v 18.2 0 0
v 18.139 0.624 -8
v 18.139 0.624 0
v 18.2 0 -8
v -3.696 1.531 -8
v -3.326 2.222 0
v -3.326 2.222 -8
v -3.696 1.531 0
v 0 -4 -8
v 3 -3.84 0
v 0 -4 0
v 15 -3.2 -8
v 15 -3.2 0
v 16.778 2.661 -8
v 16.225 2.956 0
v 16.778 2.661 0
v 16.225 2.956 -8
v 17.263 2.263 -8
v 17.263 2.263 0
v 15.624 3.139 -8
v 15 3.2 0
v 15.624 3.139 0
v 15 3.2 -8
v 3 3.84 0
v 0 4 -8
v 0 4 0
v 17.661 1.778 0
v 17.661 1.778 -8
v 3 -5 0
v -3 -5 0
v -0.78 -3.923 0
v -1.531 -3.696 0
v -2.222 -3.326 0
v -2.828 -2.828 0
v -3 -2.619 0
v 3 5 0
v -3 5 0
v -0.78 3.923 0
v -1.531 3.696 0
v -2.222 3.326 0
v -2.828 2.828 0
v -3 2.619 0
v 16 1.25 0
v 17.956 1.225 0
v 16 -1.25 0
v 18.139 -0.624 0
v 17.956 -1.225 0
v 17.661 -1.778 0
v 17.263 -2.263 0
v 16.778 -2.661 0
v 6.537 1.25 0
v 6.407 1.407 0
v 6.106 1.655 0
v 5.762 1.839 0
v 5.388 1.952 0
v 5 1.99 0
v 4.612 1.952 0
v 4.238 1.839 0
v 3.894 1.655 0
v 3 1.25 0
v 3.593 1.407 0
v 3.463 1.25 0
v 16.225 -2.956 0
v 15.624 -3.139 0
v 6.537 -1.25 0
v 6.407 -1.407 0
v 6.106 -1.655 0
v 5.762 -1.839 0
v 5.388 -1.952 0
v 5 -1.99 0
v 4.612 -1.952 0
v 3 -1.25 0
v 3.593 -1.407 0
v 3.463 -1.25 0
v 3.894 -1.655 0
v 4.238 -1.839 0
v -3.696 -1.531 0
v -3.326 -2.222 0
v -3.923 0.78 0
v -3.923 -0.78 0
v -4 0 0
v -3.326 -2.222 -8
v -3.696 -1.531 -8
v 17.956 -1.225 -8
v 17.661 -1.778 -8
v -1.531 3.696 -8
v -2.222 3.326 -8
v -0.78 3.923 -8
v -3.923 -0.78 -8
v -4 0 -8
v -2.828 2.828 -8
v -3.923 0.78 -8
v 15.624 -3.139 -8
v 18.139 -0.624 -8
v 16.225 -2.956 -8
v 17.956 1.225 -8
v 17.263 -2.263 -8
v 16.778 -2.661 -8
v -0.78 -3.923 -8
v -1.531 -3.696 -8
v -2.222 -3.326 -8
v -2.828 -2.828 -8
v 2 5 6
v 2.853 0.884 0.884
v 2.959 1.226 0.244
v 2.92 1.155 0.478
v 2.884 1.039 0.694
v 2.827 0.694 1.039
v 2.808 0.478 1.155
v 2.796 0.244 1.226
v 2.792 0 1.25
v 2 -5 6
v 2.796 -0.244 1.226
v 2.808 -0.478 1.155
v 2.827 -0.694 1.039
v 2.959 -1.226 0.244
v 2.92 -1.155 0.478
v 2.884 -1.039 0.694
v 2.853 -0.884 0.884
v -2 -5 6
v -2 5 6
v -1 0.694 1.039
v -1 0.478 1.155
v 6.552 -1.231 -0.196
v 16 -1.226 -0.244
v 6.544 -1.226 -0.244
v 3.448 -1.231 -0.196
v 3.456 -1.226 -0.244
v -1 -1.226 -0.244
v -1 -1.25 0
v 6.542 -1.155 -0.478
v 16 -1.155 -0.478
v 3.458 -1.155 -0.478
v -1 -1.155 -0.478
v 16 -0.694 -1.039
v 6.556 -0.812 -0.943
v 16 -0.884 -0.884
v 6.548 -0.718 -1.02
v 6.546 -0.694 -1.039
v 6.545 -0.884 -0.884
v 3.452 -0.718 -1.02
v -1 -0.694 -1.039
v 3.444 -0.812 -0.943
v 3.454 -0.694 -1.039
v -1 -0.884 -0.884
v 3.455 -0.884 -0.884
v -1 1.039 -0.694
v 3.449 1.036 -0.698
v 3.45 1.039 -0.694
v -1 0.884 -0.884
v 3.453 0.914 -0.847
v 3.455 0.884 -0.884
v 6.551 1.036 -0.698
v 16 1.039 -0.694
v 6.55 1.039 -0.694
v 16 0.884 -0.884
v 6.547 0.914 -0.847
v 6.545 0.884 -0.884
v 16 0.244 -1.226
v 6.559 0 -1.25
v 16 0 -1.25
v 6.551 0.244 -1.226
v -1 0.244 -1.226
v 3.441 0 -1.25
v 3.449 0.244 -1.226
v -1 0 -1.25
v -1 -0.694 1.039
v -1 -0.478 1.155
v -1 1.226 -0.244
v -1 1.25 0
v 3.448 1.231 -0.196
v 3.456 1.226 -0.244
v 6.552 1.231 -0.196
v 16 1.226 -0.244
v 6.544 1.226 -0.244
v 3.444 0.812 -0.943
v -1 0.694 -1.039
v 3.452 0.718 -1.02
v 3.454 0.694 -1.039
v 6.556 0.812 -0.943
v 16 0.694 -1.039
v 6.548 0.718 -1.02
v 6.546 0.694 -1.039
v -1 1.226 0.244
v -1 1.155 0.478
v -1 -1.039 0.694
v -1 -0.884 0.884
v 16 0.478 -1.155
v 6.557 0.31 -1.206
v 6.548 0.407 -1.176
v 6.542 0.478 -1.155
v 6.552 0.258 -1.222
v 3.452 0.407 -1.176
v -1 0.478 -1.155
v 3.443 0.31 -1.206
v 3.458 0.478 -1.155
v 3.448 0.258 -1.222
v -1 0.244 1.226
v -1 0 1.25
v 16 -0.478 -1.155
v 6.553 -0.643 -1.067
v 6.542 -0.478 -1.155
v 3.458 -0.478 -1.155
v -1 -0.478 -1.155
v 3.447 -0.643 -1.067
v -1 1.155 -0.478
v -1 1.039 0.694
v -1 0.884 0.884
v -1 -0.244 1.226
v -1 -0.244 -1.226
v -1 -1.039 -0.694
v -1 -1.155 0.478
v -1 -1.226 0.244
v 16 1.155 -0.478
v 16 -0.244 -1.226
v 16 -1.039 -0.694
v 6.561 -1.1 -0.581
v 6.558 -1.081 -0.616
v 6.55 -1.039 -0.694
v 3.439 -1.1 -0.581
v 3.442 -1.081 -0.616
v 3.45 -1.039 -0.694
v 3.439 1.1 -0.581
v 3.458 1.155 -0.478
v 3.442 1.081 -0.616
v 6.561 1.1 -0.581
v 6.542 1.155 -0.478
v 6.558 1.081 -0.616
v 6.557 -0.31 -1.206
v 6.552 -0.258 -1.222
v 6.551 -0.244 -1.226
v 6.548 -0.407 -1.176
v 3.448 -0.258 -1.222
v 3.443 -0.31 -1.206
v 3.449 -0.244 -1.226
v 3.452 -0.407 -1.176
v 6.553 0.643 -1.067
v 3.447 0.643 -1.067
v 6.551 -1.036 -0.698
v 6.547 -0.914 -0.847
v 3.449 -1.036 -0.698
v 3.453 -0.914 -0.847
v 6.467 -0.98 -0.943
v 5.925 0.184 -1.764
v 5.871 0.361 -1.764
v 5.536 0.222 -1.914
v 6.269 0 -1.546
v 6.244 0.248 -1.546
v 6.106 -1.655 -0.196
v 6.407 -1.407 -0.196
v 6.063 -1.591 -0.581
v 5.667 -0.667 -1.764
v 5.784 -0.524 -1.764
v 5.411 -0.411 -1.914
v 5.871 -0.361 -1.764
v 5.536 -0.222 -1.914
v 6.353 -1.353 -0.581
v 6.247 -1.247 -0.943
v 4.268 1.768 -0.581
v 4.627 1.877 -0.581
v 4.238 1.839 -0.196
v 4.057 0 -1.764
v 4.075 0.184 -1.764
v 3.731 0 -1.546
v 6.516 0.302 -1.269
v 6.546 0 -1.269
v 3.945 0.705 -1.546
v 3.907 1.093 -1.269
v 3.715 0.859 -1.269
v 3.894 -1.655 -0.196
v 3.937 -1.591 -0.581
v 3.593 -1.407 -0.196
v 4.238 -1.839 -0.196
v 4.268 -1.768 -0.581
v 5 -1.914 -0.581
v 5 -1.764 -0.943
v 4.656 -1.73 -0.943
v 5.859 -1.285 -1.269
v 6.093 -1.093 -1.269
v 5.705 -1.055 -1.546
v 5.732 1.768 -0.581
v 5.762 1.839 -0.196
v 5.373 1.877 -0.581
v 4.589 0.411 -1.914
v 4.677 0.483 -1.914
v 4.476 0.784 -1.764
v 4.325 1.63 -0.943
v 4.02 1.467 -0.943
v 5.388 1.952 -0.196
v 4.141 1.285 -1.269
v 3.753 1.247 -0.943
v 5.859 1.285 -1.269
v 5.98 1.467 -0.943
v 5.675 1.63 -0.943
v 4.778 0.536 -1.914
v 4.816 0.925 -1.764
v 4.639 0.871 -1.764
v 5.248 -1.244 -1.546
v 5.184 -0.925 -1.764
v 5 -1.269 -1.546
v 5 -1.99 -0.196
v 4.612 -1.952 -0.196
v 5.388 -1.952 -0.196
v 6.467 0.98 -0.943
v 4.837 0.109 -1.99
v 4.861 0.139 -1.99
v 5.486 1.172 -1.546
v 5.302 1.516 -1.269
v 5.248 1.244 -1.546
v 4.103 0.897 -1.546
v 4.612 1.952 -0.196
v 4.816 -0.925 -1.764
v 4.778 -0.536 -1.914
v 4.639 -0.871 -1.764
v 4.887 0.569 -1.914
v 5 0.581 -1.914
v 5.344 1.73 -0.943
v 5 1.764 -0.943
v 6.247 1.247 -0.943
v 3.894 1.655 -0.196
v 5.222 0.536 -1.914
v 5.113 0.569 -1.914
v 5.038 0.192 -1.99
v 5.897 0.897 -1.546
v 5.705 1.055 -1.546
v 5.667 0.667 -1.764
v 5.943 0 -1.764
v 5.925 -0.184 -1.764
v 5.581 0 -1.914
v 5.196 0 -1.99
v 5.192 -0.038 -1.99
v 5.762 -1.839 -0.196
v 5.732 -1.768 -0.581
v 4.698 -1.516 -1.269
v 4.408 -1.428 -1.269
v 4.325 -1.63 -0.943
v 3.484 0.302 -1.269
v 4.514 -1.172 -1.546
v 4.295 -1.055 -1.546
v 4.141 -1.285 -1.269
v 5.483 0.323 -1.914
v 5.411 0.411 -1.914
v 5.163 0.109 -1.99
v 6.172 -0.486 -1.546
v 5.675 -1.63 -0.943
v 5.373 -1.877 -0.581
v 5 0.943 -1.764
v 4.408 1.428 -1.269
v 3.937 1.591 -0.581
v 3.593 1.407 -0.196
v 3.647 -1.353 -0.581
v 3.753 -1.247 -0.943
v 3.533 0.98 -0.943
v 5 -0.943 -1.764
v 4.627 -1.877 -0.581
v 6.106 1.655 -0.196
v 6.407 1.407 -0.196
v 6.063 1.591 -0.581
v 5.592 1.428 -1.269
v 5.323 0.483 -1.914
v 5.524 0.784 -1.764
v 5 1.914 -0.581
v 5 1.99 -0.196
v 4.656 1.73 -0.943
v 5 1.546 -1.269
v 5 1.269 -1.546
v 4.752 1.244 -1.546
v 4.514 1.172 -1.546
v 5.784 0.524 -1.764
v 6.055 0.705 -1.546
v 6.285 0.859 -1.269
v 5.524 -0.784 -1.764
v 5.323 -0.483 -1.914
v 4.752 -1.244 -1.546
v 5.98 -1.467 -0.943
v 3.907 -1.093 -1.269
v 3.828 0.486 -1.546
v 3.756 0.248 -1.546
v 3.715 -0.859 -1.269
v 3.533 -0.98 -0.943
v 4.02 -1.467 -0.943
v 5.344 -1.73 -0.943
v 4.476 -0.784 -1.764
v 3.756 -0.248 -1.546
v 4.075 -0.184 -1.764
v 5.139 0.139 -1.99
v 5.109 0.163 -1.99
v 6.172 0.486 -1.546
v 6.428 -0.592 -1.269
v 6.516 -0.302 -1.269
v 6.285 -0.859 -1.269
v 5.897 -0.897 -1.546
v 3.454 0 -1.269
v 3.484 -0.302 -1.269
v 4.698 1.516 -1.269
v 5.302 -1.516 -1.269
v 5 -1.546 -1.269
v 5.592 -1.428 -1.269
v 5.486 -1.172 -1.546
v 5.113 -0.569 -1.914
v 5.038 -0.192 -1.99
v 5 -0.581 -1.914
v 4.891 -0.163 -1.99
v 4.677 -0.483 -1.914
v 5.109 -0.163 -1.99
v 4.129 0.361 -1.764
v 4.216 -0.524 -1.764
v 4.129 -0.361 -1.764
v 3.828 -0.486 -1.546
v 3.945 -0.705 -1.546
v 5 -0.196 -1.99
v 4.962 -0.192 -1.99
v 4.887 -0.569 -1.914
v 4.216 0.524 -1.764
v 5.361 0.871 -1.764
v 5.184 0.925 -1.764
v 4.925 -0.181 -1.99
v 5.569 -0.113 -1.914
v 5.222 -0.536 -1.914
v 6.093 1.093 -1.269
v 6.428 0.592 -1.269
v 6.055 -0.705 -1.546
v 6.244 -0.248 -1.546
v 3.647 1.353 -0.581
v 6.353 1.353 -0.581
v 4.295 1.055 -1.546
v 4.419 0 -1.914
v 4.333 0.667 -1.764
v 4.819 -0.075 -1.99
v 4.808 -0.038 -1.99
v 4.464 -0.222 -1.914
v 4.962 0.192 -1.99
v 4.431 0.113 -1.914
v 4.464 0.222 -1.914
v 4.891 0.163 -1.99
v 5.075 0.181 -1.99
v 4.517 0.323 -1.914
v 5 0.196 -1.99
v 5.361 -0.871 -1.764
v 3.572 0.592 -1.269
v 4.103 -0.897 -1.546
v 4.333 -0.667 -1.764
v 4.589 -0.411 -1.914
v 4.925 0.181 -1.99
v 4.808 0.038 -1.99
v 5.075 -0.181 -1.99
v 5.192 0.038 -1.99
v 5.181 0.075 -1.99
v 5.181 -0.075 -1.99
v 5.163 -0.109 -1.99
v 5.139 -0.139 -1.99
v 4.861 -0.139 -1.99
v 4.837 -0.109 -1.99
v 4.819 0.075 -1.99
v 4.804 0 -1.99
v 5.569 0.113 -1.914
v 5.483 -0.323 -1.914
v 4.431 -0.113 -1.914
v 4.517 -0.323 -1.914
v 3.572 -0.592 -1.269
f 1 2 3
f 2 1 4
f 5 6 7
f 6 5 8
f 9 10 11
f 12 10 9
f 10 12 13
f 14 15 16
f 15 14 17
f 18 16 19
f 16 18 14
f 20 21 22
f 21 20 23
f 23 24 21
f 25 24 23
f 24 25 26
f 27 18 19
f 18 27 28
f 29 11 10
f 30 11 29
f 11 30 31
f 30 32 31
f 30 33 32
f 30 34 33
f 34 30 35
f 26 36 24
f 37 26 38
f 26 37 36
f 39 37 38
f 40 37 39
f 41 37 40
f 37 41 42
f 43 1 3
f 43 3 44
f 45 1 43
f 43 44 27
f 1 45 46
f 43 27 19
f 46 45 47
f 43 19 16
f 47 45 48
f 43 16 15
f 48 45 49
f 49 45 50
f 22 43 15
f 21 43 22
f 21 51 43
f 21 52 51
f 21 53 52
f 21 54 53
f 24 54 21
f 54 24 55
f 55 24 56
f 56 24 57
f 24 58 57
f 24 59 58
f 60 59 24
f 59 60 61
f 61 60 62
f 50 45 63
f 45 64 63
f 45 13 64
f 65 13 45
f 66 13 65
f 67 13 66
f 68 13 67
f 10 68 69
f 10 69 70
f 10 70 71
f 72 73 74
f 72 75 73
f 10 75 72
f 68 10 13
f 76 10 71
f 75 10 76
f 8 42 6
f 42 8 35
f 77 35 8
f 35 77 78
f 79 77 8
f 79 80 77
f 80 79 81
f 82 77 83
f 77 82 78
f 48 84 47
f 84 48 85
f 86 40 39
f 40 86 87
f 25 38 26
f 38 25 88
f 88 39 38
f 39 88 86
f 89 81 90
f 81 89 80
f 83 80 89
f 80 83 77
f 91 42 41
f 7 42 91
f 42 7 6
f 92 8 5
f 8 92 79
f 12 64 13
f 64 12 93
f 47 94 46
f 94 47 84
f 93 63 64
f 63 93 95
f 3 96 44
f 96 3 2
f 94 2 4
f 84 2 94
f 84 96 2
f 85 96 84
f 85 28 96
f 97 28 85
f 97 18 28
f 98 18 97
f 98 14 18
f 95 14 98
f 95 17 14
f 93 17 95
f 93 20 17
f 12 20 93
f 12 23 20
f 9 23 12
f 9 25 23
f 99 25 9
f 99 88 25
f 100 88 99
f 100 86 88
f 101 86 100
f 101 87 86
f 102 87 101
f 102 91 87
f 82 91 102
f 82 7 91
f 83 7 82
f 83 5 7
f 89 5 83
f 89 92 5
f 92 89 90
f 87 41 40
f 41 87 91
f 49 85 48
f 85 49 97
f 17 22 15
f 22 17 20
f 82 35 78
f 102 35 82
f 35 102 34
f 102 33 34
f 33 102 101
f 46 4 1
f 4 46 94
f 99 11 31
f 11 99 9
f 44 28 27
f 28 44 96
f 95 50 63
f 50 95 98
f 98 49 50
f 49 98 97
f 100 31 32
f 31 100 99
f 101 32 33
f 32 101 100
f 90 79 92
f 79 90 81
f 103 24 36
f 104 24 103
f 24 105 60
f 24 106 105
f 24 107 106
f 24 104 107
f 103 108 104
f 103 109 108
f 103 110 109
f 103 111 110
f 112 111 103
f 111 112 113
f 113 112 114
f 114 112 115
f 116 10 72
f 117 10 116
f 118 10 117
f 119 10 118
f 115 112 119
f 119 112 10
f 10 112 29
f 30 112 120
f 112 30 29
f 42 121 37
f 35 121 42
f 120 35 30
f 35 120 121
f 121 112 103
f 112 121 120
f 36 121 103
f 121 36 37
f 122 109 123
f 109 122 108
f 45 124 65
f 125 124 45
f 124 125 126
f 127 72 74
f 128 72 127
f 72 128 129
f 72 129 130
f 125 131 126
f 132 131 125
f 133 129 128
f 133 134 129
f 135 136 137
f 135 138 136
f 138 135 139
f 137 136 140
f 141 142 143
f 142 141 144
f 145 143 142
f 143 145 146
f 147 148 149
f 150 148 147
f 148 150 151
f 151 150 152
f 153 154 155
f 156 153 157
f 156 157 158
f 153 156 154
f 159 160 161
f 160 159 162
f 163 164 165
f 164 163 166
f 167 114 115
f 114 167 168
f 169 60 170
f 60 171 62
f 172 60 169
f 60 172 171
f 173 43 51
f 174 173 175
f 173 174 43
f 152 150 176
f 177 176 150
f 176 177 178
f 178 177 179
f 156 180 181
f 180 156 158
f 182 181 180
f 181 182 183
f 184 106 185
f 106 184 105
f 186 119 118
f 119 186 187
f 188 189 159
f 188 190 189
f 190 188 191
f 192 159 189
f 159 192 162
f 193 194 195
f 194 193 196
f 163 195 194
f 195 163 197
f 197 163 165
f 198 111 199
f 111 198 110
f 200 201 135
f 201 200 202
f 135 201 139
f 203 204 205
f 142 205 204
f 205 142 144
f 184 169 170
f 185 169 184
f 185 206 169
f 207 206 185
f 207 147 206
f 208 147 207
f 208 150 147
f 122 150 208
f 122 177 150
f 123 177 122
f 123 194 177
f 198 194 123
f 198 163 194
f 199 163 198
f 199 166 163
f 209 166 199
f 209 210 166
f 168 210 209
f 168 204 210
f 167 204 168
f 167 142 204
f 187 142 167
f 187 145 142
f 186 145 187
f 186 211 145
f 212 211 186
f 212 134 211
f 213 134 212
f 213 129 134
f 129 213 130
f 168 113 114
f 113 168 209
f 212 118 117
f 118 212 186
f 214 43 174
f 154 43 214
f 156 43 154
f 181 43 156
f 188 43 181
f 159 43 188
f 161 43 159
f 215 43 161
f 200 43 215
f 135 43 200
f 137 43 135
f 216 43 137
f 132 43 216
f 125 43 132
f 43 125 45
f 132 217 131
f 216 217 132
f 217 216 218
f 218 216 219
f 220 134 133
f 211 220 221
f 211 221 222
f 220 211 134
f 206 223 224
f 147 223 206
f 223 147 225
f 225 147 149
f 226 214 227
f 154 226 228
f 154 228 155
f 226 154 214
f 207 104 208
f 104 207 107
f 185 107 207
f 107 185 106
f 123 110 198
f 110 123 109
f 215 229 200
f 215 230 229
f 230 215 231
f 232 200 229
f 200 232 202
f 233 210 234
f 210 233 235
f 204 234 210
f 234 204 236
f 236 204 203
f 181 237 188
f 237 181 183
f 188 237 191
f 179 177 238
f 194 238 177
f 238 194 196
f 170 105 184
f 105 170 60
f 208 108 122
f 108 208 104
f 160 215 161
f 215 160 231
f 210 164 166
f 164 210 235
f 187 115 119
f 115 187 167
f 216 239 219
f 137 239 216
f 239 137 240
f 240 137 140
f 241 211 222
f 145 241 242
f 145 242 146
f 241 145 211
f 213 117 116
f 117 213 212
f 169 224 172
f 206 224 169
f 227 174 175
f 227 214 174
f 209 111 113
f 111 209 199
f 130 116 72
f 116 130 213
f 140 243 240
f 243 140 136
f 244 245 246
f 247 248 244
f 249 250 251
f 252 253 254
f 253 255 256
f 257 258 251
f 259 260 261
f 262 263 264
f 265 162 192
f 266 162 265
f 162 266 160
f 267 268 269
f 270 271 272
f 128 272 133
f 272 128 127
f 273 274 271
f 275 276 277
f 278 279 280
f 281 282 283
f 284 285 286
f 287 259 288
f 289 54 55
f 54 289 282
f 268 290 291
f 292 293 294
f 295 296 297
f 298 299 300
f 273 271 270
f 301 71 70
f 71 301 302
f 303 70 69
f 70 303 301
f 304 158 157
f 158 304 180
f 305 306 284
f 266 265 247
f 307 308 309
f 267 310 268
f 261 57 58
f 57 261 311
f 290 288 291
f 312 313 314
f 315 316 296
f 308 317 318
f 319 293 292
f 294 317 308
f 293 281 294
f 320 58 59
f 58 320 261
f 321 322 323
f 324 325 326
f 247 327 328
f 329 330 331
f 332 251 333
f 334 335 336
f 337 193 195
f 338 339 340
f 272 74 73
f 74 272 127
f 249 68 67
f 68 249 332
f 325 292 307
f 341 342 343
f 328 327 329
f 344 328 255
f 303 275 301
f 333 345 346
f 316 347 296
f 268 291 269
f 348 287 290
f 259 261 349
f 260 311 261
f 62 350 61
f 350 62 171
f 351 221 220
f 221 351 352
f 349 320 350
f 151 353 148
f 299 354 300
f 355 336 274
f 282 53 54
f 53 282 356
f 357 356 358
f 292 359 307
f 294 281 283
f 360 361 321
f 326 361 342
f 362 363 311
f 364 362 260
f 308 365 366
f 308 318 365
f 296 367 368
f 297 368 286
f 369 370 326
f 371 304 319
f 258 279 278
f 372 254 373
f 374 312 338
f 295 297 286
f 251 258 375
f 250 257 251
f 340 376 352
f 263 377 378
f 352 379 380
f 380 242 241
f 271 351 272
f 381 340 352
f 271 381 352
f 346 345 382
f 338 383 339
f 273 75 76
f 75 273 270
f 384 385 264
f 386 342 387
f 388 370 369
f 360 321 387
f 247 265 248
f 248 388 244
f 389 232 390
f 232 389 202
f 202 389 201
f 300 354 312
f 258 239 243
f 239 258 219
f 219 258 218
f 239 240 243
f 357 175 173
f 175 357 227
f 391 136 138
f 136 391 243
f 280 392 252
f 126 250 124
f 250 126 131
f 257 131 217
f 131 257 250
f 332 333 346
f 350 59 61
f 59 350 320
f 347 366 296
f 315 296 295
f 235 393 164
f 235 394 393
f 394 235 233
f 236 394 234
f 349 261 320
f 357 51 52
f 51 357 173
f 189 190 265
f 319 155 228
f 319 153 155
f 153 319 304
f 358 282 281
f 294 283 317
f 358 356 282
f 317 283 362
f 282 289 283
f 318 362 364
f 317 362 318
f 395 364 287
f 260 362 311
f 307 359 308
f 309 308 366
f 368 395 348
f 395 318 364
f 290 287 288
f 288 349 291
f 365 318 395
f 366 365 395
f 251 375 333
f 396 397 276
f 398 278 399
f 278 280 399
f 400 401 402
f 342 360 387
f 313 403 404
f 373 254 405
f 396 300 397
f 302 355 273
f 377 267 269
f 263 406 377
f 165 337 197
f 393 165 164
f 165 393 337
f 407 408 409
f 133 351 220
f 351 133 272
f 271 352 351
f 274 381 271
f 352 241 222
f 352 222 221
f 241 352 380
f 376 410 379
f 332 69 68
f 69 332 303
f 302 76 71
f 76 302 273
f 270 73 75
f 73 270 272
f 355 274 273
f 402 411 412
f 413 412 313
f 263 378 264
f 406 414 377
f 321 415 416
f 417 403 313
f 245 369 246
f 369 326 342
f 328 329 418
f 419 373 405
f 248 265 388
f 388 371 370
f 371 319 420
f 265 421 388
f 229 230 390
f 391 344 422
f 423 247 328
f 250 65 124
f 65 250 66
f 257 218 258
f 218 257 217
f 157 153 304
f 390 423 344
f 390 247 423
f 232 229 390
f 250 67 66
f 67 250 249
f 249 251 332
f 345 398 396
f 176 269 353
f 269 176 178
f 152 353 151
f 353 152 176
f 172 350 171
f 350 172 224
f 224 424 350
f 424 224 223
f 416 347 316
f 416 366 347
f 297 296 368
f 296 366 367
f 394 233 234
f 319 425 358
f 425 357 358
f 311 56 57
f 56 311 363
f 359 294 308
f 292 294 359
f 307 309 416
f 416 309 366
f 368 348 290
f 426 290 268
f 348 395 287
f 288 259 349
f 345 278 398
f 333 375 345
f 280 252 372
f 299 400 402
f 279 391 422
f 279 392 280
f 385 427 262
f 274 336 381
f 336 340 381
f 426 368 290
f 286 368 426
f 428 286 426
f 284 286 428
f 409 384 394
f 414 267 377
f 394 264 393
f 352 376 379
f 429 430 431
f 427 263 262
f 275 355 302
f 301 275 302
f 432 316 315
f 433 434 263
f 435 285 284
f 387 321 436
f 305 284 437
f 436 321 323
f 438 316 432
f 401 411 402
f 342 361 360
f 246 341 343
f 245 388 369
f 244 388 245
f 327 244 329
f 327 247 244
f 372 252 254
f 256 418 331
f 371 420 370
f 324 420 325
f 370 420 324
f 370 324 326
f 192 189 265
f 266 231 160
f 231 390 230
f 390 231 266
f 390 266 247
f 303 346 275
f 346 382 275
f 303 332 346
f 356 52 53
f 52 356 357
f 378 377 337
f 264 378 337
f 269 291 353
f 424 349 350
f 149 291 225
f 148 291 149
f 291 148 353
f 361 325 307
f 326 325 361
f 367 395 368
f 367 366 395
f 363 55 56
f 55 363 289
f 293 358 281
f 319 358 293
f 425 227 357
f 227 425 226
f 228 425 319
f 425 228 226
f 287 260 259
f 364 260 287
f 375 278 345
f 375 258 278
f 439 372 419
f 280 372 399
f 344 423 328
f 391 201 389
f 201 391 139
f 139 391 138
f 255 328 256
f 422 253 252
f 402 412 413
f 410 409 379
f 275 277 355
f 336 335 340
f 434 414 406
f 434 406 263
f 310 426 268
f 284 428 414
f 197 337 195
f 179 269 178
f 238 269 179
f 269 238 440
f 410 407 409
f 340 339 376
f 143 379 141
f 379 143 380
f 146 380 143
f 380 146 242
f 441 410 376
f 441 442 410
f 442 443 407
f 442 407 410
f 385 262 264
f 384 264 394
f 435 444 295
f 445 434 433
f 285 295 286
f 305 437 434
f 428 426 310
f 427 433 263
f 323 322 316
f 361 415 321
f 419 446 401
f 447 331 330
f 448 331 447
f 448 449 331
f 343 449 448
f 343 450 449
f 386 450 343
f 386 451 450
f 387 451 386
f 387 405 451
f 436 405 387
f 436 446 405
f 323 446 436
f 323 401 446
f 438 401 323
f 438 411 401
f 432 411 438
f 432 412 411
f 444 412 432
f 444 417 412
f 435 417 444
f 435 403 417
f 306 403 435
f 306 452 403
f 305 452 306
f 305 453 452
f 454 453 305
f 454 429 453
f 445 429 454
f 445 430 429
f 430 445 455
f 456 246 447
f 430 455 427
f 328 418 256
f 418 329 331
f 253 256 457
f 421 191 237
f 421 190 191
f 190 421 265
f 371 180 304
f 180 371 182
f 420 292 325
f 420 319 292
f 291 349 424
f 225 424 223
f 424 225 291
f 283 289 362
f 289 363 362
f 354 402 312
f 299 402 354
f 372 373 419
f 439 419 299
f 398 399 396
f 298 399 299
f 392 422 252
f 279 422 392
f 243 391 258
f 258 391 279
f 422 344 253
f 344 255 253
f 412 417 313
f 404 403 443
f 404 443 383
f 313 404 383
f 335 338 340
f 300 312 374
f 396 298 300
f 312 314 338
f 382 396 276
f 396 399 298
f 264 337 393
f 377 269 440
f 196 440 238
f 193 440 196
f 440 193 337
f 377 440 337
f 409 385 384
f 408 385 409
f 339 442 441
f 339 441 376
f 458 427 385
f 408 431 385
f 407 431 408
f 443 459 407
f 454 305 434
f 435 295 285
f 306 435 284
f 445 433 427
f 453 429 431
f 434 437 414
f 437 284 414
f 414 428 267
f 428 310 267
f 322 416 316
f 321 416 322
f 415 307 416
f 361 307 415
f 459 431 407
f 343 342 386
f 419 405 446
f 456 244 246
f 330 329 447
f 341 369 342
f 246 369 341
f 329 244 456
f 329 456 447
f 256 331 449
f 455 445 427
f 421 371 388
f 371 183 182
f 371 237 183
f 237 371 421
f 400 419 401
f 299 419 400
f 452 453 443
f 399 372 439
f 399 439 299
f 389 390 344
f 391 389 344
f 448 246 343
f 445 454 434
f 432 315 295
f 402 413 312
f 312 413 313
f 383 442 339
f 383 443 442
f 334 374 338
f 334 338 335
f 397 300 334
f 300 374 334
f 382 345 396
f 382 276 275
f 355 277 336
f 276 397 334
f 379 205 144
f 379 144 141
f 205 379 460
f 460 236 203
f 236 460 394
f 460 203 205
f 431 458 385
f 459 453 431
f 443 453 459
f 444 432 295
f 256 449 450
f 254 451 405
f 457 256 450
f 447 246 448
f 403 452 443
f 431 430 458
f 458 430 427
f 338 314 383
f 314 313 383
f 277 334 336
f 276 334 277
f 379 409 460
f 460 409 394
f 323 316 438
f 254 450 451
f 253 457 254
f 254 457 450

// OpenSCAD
// COBRA-Snap Finger Segment - distal
// Dovetail slide joints, no glue needed

$fn = 32;

module finger_segment() {
    difference() {
        union() {
            // Main body
            hull() {
                translate([0, 0, -4])
                cylinder(h=8, d=8, center=true);
                
                translate([15.0, 0, -4])
                cylinder(h=8, d=6.4, center=true);
            }
            
            // Male dovetail (proximal end)
            translate([0, 0, 0])
            rotate([90, 0, 0])
            linear_extrude(height=10, center=true)
            polygon(points=[[-3, 0], [3, 0], [2, 6], [-2, 6]]);
        }
        
        // Female dovetail socket (distal end) - skip for distal
        
        
        // Tendon channel
        translate([7.5, 0, 0])
        rotate([0, 90, 0])
        cylinder(h=17.0, d=2.5, center=true);
        
        // Quick-connect socket for tendon
        translate([5, 0, 0])
        sphere(d=4);
    }
}

finger_segment();
